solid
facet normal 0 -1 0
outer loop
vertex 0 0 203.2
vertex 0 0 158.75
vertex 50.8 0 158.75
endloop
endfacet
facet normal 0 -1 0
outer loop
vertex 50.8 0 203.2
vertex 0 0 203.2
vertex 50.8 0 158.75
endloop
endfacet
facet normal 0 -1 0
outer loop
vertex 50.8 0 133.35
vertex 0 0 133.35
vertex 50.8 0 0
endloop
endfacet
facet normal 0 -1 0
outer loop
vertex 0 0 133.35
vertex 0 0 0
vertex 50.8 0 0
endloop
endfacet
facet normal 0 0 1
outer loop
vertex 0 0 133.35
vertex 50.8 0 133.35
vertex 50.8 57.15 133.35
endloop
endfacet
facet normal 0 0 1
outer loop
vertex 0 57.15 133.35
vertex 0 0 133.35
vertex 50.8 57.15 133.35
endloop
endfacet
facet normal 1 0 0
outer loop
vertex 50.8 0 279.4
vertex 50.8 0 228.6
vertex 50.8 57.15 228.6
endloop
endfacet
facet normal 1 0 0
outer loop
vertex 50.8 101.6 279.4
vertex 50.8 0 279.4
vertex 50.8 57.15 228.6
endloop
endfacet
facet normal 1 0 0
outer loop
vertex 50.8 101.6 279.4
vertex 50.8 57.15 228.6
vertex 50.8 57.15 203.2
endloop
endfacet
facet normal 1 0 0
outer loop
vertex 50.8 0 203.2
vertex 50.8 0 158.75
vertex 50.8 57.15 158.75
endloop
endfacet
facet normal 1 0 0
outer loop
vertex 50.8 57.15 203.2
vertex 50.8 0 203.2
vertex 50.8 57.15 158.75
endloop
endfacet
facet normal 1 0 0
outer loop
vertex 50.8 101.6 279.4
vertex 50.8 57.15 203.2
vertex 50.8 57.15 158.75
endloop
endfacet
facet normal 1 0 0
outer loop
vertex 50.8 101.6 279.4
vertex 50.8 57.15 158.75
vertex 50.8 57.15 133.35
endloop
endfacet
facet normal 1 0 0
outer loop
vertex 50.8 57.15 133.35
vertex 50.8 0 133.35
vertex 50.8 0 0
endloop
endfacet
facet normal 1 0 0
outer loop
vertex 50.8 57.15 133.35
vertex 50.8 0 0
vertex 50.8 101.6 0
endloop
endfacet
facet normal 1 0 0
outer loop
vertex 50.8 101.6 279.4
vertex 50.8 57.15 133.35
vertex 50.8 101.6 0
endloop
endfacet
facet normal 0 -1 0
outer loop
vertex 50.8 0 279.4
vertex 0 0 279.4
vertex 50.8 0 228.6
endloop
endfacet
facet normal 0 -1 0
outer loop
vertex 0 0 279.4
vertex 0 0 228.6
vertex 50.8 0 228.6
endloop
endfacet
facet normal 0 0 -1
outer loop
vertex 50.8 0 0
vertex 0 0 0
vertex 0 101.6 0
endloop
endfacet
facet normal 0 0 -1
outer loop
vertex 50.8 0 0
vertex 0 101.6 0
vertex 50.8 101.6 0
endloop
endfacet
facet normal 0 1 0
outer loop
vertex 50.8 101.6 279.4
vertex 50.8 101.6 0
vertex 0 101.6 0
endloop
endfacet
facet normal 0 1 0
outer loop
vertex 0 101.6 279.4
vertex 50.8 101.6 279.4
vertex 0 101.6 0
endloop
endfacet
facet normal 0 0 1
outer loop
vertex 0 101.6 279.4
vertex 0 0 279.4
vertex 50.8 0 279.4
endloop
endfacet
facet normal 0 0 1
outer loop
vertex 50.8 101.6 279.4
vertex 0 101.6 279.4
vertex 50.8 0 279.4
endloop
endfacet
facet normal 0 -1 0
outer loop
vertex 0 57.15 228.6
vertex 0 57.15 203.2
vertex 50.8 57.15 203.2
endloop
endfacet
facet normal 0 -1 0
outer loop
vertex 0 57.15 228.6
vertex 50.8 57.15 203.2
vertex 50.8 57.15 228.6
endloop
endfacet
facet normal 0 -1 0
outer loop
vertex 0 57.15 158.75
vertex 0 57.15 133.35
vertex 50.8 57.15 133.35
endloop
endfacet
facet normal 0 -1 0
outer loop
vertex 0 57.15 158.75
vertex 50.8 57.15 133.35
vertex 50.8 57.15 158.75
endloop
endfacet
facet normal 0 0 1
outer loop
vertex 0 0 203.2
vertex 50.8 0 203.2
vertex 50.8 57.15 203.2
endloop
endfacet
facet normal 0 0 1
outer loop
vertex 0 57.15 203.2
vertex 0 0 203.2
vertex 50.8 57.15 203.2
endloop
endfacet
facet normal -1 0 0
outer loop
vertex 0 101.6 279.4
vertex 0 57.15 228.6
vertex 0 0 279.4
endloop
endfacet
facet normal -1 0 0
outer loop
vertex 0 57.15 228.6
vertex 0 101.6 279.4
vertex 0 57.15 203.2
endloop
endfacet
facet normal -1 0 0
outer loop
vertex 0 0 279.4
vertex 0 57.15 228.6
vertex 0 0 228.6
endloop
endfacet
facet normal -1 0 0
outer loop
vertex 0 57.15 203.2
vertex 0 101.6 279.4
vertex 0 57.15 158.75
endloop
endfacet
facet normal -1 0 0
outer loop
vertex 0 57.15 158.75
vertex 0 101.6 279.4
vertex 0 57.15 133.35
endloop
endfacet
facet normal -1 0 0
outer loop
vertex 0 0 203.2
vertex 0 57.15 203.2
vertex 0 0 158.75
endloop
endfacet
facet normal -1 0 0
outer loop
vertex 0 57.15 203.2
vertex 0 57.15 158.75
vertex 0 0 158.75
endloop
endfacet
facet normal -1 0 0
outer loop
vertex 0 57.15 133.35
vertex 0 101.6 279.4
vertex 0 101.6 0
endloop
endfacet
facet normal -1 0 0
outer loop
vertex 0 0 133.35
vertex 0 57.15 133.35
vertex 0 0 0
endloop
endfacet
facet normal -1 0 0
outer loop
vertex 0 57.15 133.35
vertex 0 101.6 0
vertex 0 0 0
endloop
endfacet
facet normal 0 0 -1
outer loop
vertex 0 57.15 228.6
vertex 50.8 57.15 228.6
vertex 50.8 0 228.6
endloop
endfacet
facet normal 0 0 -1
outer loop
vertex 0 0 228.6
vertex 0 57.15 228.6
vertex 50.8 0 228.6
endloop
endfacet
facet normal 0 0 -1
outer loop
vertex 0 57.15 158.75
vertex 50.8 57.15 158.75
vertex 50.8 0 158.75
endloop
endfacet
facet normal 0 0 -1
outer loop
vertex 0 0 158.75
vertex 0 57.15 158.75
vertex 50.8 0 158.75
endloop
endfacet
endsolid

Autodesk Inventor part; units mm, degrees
ref_plane "YZ Plane" through (0, 0, 0) normal (1, 0, 0) x (0, 1, 0)
ref_plane "XZ Plane" through (0, 0, 0) normal (0, 1, 0) x (-1, 0, 0)
ref_plane "XY Plane" through (0, 0, 0) normal (0, 0, 1) x (1, 0, 0)
sketch "Sketch1" plane through (0, 0, 0) normal (0, 0, 1) x (1, 0, 0)
  line L0 (0, 0) -> (50.8, 0)
  line L1 (50.8, 0) -> (50.8, 101.6)
  line L2 (50.8, 101.6) -> (0, 101.6)
  line L3 (0, 101.6) -> (0, 0)
  dimension "d0" = 50.8
  dimension "d1" = 101.6
extrude "Extrusion1" add sketch "Sketch1" along normal blind 279.4
sketch "Sketch2" plane through (50.8, 0, 0) normal (1, 0, 0) x (0, 0, -1)
  line L0 (0, 0) -> (-279.4, 0) projected
  line L1 (-228.6, 0) -> (-203.2, 0)
  line L2 (-203.2, 0) -> (-203.2, 57.15)
  line L3 (-203.2, 57.15) -> (-228.6, 57.15)
  line L4 (-228.6, 57.15) -> (-228.6, 0)
  line L5 (-279.4, 0) -> (-279.4, 101.6) projected
  line L6 (-158.75, 0) -> (-133.35, 0)
  line L7 (-133.35, 0) -> (-133.35, 57.15)
  line L8 (-133.35, 57.15) -> (-158.75, 57.15)
  line L9 (-158.75, 57.15) -> (-158.75, 0)
  dimension "d4" = 25.4
  dimension "d5" = 57.15
  dimension "d6" = 50.8
  dimension "d7" = 25.4
  dimension "d8" = 44.45
extrude "Extrusion2" cut sketch "Sketch2" against normal blind 266.7
properties part number "LargeSideHook"
